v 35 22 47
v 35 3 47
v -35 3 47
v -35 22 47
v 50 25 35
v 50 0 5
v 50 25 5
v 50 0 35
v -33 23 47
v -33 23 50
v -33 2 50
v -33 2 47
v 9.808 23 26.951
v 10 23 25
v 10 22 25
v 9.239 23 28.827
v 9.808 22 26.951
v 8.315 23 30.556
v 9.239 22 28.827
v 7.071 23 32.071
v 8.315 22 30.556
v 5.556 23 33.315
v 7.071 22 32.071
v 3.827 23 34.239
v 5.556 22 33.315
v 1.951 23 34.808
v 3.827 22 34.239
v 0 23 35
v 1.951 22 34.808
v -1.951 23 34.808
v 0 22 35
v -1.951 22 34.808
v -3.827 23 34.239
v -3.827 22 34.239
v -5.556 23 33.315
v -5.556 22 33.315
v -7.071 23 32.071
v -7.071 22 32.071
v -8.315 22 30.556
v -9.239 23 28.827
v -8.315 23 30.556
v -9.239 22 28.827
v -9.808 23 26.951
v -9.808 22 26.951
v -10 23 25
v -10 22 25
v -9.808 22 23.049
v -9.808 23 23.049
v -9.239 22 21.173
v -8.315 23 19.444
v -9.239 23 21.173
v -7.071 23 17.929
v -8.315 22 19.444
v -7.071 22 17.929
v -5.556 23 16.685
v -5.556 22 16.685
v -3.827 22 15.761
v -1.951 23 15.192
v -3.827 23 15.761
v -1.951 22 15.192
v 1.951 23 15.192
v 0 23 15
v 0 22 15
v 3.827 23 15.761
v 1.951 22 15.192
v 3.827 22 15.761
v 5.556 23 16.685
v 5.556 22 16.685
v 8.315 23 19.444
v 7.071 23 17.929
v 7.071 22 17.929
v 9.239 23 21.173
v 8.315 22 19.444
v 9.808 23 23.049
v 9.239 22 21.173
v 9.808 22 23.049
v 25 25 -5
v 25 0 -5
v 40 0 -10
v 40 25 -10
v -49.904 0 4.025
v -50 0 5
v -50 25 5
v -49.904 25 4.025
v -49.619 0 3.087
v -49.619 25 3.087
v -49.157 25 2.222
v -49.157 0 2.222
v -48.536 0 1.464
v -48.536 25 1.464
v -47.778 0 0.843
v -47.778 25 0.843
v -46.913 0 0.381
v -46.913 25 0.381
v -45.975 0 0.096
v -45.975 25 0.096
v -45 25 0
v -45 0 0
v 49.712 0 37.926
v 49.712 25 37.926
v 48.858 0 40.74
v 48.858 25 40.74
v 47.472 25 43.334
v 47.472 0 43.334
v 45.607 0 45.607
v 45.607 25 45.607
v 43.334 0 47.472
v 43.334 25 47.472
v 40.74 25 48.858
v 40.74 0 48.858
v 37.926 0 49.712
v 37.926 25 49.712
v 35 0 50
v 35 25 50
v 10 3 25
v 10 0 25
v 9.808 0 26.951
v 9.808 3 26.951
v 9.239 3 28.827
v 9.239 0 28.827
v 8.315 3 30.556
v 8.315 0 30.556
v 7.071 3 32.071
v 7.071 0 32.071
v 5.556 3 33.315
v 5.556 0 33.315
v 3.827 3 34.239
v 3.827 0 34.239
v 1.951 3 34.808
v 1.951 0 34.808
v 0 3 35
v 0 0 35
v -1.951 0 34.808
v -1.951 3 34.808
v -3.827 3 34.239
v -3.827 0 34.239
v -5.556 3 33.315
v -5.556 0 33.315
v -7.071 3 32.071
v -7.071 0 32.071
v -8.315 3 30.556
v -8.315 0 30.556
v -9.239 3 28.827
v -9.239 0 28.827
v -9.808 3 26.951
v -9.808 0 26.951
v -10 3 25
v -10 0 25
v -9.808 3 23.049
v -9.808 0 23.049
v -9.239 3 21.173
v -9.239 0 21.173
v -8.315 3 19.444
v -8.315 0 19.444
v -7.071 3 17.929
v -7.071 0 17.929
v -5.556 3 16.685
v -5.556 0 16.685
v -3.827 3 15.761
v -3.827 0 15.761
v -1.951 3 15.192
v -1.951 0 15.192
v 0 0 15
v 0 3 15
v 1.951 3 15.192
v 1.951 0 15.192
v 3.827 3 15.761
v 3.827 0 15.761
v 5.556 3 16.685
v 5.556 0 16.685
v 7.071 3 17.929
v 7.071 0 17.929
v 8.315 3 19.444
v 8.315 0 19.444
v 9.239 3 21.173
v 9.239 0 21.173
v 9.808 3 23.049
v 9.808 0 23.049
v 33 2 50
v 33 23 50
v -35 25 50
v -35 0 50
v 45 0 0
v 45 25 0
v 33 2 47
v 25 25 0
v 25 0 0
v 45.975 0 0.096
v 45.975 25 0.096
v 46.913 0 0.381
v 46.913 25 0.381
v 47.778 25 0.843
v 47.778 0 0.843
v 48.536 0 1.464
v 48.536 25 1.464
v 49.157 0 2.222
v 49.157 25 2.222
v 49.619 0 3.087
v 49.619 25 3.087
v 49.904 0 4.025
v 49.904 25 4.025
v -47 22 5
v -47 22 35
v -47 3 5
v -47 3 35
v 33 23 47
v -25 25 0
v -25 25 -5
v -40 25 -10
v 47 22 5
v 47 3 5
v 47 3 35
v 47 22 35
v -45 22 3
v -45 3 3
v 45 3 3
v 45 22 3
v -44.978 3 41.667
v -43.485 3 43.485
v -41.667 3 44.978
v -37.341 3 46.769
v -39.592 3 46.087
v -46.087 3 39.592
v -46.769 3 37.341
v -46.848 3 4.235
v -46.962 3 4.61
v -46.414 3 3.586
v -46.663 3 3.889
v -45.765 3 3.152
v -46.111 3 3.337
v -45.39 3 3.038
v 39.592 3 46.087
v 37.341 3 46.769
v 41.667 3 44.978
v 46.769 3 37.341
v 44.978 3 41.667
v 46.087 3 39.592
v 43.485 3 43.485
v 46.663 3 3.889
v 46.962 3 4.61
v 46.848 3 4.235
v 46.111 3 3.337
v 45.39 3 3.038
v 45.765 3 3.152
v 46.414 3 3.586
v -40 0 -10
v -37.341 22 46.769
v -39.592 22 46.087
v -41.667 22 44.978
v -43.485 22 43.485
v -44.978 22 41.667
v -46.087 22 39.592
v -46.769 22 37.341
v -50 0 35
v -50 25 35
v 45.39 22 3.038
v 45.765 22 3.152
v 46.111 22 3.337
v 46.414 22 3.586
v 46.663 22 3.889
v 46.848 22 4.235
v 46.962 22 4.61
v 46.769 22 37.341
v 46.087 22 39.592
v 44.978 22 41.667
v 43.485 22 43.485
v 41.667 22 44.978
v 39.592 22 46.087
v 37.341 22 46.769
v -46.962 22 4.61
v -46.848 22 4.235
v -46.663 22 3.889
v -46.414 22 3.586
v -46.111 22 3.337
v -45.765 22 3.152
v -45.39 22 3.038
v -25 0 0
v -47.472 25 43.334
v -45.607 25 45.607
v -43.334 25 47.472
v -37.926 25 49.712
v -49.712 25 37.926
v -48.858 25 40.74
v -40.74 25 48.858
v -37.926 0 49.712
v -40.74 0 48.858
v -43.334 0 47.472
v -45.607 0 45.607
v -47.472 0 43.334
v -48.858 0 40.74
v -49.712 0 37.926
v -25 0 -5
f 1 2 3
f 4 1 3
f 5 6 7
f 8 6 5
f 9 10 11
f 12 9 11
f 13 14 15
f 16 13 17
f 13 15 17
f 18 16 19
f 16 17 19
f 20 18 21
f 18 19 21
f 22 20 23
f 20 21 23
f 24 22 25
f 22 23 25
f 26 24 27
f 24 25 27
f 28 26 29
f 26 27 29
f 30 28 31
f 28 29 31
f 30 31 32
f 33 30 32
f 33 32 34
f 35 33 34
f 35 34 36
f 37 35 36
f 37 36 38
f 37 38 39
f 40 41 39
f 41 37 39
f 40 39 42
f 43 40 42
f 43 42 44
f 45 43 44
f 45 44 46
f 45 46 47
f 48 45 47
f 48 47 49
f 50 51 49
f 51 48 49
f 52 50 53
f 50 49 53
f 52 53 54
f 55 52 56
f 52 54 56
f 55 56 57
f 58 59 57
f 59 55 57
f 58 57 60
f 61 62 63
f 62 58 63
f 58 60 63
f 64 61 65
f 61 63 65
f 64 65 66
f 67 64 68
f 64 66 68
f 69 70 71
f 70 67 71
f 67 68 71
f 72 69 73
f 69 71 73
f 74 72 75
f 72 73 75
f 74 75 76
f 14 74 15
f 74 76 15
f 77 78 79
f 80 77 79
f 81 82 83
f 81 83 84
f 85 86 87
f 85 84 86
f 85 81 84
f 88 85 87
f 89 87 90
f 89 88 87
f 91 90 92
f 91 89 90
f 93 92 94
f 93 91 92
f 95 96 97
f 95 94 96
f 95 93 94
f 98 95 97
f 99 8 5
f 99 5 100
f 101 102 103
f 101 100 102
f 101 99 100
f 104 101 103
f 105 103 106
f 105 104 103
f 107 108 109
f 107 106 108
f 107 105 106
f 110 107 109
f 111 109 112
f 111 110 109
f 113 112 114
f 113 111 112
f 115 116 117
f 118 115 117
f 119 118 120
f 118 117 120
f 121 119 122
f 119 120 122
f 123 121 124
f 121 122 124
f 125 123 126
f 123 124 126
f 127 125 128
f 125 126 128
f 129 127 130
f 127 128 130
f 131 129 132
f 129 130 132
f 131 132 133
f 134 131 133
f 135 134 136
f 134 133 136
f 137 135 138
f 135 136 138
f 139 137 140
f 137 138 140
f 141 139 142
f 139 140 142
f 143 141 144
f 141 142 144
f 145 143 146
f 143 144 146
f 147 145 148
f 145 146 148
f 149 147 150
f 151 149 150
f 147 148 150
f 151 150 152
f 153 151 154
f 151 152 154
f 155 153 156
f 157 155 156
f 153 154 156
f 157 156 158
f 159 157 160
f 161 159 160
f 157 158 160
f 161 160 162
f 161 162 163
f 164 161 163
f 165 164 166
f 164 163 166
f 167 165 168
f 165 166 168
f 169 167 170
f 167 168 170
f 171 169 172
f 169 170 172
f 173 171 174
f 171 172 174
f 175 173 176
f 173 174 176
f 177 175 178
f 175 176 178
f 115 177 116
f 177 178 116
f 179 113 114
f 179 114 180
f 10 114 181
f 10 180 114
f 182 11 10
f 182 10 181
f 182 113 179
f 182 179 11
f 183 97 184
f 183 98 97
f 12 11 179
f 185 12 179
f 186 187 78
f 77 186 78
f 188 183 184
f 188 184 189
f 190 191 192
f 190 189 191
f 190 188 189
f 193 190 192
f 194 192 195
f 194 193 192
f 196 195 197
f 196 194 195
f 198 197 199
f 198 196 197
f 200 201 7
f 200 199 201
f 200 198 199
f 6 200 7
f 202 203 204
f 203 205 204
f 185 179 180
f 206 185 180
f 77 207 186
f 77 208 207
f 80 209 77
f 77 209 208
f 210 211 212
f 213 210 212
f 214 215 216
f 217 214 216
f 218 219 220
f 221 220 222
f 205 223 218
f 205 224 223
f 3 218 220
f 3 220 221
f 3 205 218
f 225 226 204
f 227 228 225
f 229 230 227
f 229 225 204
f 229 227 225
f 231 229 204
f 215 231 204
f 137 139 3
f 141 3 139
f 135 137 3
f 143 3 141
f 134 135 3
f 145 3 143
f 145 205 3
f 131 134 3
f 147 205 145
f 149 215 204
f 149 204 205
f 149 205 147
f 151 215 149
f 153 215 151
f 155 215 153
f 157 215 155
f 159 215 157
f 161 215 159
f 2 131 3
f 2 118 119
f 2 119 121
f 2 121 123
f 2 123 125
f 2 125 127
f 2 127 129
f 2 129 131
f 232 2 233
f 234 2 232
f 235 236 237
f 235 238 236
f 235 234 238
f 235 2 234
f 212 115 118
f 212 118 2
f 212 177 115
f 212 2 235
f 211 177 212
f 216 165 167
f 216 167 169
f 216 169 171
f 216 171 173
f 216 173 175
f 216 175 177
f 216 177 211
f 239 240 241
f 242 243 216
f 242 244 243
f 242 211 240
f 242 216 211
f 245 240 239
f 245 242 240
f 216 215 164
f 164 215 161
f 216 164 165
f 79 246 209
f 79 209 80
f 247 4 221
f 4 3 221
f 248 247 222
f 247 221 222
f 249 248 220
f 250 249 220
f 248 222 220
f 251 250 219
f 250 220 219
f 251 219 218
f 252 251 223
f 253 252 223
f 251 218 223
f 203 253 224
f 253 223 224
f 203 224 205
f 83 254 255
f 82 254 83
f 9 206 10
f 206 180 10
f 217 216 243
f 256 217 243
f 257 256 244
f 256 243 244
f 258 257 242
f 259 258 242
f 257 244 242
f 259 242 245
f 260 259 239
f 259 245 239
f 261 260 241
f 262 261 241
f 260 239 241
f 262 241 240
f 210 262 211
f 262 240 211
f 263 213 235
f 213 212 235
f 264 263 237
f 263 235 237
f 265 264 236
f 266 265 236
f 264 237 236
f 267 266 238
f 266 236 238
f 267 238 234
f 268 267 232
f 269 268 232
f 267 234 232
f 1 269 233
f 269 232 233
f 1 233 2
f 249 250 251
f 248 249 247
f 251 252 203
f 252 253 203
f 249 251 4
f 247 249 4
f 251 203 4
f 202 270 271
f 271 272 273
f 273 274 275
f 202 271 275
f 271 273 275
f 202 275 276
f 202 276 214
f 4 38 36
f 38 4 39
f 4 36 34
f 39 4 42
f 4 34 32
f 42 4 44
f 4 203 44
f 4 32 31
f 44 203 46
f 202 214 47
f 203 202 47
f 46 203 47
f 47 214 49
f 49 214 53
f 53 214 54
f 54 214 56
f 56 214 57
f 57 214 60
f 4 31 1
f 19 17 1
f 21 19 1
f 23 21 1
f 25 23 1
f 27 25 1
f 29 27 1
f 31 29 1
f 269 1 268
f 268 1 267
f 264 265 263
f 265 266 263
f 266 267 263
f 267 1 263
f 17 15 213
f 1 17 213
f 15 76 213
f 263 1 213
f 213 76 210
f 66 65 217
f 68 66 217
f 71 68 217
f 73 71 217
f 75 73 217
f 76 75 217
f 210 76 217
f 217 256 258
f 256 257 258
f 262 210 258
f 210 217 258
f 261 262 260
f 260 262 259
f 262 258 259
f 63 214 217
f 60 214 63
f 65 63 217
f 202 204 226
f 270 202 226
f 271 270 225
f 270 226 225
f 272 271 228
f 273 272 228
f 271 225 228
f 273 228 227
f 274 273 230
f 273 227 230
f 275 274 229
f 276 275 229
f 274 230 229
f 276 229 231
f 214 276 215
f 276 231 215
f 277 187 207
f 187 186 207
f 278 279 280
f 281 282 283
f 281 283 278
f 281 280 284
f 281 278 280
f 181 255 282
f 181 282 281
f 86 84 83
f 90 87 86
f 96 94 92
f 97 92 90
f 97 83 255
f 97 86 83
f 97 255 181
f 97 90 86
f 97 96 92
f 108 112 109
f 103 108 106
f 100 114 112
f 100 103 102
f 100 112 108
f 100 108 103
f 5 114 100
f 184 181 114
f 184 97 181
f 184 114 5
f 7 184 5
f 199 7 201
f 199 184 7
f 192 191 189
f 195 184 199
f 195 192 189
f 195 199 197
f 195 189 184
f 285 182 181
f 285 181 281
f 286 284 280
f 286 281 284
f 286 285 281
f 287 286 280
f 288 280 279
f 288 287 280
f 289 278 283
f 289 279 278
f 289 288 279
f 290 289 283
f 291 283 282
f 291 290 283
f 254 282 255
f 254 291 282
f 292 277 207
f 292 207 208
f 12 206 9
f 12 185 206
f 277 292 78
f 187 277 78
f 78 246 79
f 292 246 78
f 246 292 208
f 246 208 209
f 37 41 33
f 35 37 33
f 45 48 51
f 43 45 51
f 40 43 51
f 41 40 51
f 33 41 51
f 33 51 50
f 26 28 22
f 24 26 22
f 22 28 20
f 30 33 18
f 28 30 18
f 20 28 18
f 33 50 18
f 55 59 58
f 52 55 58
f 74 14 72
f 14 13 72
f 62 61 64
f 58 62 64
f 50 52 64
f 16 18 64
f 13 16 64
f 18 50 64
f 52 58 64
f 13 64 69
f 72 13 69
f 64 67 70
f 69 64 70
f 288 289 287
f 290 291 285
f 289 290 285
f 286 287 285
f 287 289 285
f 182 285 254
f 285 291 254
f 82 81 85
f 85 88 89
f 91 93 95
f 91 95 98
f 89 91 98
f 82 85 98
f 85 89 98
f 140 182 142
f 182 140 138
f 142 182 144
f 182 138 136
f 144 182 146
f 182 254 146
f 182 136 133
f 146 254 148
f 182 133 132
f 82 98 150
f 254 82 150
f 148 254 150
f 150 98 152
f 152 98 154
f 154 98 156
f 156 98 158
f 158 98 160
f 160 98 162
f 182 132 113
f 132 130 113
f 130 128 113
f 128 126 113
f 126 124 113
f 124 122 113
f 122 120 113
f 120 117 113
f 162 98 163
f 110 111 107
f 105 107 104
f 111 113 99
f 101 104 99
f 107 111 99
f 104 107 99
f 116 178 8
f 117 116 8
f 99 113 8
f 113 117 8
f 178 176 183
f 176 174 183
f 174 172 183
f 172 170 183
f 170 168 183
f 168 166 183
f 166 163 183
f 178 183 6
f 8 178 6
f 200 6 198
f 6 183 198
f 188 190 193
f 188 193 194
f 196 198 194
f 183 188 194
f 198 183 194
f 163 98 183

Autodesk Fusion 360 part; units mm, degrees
sketch "Sketch1" plane through (0, 0, 0) normal (0, 1, 0) x (1, 0, 0)
  line L0 (0, -35) -> (0, 22.8292) construction
  line L1 (25, 0) -> (25, 5)
  line L2 (25, 5) -> (40, 10)
  line L3 (40, 10) -> (0, 10)
  line L4 (-25, 0) -> (-25, 5)
  line L5 (-25, 5) -> (-40, 10)
  line L6 (-40, 10) -> (0, 10)
  line L7 (25, 0) -> (45, 0)
  line L8 (50, -5) -> (50, -35)
  line L9 (35, -50) -> (-35, -50)
  line L10 (-50, -35) -> (-50, -5)
  line L11 (-45, 0) -> (-25, 0)
  circle A0 centre (0, -25) radius 10
  arc A1 (35, -50) -> (50, -35) centre (35, -35) ccw
  arc A2 (-50, -35) -> (-35, -50) centre (-35, -35) ccw
  arc A3 (-45, 0) -> (-50, -5) centre (-45, -5) ccw
  arc A4 (50, -5) -> (45, 0) centre (45, -5) ccw
  point P0 (50, 0)
  point P1 (50, -50)
  dimension "d5" = 40
  dimension "d6" = 5
  dimension "d7" = 25
  dimension "d8" = 5
  dimension "d9" = 50
  dimension "d10" = 20
  dimension "d11" = 25
  dimension "d14" = 15
  dimension "d15" = 15
  dimension "d16" = 5
  dimension "d17" = 5
extrude "Extrude1" add sketch "Sketch1" along normal blind 25 contours L1 L2 L3 L4 L5 L6 L7 L8 L9 L10 L11 A1 A2 A3 A4 | A0 makes body 1
split "Split1" by plane through (25, 0, 0) normal (0, 0, -1) bodies 1 makes body 2 at (-13.3333, 8.3333, -10)
sketch "Sketch2" plane through (0, 0, 50) normal (0, 0, 1) x (-1, 0, 0)
  line L0 (35, 0) -> (-35, 0)
  line L1 (-35, 0) -> (-35, -25)
  line L2 (-35, -25) -> (35, -25)
  line L3 (35, -25) -> (35, 0)
  line L4 (33, -2) -> (-33, -2)
  line L5 (-33, -2) -> (-33, -23)
  line L6 (-33, -23) -> (33, -23)
  line L7 (33, -23) -> (33, -2)
  dimension "d18" = -2
extrude "Extrude2" cut sketch "Sketch2" against normal blind 3 contours L4 L5 L6 L7 bodies 1
shell "Shell1" thickness 3 removed faces 1 at (11, 9, 47) on bodies 1
extrude "Extrude3" cut sketch "Sketch1" along normal blind 23 contours A0 bodies 1
